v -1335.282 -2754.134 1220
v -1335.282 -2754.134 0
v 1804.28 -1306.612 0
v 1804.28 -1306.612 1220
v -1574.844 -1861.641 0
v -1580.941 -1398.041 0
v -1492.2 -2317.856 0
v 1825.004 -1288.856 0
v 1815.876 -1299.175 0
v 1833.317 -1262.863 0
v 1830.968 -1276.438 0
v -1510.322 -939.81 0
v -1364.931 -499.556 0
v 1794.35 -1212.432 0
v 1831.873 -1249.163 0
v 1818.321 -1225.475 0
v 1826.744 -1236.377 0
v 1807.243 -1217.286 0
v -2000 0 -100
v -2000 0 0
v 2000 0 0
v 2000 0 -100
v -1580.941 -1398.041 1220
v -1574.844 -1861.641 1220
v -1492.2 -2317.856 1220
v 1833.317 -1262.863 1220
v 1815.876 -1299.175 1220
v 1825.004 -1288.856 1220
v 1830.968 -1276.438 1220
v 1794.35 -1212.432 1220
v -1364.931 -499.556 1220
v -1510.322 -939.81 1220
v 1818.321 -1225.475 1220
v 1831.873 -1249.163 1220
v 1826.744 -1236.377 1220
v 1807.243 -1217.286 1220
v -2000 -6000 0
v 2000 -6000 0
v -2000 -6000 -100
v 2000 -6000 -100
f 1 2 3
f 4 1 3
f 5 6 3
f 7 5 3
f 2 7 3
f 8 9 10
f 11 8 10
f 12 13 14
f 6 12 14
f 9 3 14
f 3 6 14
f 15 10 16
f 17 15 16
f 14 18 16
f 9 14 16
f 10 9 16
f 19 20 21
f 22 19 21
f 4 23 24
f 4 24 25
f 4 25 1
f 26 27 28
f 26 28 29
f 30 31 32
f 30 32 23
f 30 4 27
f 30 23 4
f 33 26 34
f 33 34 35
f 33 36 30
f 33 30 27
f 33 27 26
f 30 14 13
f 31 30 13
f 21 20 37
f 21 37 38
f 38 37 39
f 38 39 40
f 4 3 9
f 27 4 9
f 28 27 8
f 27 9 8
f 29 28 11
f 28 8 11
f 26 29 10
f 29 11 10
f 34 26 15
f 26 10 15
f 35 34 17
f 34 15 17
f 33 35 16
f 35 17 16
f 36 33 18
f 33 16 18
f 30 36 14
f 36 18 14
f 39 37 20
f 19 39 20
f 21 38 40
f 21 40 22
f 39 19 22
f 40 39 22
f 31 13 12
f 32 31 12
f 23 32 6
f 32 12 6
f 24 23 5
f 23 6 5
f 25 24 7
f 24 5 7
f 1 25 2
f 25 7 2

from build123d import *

# Parameters (mm, degrees)
F0_W     = 4000
F0_H     = 6000
F1_DEPTH = 100
F3_DEPTH = 1220


with BuildPart() as f1:
    # F0 (on Top) → F1 (new body)
    with BuildSketch(Plane.XY):
        with Locations((0, -3000)):
            Rectangle(F0_W, F0_H)
    extrude(amount=-F1_DEPTH)


with BuildPart() as f3:
    # F2 (on Top) → F3 (new body)
    with BuildSketch(Plane.XY):
        with BuildLine():
            Line((1794.350326, -1212.431682), (-1364.931464, -499.556303))
            ThreePointArc((-1364.931464, -499.556303), (-1587.521151, -1629.967329), (-1335.282456, -2754.134087))
            Line((-1335.282456, -2754.134087), (1804.279734, -1306.61168))
            ThreePointArc((1804.279734, -1306.61168), (1833.069194, -1255.962975), (1794.350326, -1212.431682))
        make_face()
    extrude(amount=F3_DEPTH)


solid = Compound([f1.part, f3.part])
